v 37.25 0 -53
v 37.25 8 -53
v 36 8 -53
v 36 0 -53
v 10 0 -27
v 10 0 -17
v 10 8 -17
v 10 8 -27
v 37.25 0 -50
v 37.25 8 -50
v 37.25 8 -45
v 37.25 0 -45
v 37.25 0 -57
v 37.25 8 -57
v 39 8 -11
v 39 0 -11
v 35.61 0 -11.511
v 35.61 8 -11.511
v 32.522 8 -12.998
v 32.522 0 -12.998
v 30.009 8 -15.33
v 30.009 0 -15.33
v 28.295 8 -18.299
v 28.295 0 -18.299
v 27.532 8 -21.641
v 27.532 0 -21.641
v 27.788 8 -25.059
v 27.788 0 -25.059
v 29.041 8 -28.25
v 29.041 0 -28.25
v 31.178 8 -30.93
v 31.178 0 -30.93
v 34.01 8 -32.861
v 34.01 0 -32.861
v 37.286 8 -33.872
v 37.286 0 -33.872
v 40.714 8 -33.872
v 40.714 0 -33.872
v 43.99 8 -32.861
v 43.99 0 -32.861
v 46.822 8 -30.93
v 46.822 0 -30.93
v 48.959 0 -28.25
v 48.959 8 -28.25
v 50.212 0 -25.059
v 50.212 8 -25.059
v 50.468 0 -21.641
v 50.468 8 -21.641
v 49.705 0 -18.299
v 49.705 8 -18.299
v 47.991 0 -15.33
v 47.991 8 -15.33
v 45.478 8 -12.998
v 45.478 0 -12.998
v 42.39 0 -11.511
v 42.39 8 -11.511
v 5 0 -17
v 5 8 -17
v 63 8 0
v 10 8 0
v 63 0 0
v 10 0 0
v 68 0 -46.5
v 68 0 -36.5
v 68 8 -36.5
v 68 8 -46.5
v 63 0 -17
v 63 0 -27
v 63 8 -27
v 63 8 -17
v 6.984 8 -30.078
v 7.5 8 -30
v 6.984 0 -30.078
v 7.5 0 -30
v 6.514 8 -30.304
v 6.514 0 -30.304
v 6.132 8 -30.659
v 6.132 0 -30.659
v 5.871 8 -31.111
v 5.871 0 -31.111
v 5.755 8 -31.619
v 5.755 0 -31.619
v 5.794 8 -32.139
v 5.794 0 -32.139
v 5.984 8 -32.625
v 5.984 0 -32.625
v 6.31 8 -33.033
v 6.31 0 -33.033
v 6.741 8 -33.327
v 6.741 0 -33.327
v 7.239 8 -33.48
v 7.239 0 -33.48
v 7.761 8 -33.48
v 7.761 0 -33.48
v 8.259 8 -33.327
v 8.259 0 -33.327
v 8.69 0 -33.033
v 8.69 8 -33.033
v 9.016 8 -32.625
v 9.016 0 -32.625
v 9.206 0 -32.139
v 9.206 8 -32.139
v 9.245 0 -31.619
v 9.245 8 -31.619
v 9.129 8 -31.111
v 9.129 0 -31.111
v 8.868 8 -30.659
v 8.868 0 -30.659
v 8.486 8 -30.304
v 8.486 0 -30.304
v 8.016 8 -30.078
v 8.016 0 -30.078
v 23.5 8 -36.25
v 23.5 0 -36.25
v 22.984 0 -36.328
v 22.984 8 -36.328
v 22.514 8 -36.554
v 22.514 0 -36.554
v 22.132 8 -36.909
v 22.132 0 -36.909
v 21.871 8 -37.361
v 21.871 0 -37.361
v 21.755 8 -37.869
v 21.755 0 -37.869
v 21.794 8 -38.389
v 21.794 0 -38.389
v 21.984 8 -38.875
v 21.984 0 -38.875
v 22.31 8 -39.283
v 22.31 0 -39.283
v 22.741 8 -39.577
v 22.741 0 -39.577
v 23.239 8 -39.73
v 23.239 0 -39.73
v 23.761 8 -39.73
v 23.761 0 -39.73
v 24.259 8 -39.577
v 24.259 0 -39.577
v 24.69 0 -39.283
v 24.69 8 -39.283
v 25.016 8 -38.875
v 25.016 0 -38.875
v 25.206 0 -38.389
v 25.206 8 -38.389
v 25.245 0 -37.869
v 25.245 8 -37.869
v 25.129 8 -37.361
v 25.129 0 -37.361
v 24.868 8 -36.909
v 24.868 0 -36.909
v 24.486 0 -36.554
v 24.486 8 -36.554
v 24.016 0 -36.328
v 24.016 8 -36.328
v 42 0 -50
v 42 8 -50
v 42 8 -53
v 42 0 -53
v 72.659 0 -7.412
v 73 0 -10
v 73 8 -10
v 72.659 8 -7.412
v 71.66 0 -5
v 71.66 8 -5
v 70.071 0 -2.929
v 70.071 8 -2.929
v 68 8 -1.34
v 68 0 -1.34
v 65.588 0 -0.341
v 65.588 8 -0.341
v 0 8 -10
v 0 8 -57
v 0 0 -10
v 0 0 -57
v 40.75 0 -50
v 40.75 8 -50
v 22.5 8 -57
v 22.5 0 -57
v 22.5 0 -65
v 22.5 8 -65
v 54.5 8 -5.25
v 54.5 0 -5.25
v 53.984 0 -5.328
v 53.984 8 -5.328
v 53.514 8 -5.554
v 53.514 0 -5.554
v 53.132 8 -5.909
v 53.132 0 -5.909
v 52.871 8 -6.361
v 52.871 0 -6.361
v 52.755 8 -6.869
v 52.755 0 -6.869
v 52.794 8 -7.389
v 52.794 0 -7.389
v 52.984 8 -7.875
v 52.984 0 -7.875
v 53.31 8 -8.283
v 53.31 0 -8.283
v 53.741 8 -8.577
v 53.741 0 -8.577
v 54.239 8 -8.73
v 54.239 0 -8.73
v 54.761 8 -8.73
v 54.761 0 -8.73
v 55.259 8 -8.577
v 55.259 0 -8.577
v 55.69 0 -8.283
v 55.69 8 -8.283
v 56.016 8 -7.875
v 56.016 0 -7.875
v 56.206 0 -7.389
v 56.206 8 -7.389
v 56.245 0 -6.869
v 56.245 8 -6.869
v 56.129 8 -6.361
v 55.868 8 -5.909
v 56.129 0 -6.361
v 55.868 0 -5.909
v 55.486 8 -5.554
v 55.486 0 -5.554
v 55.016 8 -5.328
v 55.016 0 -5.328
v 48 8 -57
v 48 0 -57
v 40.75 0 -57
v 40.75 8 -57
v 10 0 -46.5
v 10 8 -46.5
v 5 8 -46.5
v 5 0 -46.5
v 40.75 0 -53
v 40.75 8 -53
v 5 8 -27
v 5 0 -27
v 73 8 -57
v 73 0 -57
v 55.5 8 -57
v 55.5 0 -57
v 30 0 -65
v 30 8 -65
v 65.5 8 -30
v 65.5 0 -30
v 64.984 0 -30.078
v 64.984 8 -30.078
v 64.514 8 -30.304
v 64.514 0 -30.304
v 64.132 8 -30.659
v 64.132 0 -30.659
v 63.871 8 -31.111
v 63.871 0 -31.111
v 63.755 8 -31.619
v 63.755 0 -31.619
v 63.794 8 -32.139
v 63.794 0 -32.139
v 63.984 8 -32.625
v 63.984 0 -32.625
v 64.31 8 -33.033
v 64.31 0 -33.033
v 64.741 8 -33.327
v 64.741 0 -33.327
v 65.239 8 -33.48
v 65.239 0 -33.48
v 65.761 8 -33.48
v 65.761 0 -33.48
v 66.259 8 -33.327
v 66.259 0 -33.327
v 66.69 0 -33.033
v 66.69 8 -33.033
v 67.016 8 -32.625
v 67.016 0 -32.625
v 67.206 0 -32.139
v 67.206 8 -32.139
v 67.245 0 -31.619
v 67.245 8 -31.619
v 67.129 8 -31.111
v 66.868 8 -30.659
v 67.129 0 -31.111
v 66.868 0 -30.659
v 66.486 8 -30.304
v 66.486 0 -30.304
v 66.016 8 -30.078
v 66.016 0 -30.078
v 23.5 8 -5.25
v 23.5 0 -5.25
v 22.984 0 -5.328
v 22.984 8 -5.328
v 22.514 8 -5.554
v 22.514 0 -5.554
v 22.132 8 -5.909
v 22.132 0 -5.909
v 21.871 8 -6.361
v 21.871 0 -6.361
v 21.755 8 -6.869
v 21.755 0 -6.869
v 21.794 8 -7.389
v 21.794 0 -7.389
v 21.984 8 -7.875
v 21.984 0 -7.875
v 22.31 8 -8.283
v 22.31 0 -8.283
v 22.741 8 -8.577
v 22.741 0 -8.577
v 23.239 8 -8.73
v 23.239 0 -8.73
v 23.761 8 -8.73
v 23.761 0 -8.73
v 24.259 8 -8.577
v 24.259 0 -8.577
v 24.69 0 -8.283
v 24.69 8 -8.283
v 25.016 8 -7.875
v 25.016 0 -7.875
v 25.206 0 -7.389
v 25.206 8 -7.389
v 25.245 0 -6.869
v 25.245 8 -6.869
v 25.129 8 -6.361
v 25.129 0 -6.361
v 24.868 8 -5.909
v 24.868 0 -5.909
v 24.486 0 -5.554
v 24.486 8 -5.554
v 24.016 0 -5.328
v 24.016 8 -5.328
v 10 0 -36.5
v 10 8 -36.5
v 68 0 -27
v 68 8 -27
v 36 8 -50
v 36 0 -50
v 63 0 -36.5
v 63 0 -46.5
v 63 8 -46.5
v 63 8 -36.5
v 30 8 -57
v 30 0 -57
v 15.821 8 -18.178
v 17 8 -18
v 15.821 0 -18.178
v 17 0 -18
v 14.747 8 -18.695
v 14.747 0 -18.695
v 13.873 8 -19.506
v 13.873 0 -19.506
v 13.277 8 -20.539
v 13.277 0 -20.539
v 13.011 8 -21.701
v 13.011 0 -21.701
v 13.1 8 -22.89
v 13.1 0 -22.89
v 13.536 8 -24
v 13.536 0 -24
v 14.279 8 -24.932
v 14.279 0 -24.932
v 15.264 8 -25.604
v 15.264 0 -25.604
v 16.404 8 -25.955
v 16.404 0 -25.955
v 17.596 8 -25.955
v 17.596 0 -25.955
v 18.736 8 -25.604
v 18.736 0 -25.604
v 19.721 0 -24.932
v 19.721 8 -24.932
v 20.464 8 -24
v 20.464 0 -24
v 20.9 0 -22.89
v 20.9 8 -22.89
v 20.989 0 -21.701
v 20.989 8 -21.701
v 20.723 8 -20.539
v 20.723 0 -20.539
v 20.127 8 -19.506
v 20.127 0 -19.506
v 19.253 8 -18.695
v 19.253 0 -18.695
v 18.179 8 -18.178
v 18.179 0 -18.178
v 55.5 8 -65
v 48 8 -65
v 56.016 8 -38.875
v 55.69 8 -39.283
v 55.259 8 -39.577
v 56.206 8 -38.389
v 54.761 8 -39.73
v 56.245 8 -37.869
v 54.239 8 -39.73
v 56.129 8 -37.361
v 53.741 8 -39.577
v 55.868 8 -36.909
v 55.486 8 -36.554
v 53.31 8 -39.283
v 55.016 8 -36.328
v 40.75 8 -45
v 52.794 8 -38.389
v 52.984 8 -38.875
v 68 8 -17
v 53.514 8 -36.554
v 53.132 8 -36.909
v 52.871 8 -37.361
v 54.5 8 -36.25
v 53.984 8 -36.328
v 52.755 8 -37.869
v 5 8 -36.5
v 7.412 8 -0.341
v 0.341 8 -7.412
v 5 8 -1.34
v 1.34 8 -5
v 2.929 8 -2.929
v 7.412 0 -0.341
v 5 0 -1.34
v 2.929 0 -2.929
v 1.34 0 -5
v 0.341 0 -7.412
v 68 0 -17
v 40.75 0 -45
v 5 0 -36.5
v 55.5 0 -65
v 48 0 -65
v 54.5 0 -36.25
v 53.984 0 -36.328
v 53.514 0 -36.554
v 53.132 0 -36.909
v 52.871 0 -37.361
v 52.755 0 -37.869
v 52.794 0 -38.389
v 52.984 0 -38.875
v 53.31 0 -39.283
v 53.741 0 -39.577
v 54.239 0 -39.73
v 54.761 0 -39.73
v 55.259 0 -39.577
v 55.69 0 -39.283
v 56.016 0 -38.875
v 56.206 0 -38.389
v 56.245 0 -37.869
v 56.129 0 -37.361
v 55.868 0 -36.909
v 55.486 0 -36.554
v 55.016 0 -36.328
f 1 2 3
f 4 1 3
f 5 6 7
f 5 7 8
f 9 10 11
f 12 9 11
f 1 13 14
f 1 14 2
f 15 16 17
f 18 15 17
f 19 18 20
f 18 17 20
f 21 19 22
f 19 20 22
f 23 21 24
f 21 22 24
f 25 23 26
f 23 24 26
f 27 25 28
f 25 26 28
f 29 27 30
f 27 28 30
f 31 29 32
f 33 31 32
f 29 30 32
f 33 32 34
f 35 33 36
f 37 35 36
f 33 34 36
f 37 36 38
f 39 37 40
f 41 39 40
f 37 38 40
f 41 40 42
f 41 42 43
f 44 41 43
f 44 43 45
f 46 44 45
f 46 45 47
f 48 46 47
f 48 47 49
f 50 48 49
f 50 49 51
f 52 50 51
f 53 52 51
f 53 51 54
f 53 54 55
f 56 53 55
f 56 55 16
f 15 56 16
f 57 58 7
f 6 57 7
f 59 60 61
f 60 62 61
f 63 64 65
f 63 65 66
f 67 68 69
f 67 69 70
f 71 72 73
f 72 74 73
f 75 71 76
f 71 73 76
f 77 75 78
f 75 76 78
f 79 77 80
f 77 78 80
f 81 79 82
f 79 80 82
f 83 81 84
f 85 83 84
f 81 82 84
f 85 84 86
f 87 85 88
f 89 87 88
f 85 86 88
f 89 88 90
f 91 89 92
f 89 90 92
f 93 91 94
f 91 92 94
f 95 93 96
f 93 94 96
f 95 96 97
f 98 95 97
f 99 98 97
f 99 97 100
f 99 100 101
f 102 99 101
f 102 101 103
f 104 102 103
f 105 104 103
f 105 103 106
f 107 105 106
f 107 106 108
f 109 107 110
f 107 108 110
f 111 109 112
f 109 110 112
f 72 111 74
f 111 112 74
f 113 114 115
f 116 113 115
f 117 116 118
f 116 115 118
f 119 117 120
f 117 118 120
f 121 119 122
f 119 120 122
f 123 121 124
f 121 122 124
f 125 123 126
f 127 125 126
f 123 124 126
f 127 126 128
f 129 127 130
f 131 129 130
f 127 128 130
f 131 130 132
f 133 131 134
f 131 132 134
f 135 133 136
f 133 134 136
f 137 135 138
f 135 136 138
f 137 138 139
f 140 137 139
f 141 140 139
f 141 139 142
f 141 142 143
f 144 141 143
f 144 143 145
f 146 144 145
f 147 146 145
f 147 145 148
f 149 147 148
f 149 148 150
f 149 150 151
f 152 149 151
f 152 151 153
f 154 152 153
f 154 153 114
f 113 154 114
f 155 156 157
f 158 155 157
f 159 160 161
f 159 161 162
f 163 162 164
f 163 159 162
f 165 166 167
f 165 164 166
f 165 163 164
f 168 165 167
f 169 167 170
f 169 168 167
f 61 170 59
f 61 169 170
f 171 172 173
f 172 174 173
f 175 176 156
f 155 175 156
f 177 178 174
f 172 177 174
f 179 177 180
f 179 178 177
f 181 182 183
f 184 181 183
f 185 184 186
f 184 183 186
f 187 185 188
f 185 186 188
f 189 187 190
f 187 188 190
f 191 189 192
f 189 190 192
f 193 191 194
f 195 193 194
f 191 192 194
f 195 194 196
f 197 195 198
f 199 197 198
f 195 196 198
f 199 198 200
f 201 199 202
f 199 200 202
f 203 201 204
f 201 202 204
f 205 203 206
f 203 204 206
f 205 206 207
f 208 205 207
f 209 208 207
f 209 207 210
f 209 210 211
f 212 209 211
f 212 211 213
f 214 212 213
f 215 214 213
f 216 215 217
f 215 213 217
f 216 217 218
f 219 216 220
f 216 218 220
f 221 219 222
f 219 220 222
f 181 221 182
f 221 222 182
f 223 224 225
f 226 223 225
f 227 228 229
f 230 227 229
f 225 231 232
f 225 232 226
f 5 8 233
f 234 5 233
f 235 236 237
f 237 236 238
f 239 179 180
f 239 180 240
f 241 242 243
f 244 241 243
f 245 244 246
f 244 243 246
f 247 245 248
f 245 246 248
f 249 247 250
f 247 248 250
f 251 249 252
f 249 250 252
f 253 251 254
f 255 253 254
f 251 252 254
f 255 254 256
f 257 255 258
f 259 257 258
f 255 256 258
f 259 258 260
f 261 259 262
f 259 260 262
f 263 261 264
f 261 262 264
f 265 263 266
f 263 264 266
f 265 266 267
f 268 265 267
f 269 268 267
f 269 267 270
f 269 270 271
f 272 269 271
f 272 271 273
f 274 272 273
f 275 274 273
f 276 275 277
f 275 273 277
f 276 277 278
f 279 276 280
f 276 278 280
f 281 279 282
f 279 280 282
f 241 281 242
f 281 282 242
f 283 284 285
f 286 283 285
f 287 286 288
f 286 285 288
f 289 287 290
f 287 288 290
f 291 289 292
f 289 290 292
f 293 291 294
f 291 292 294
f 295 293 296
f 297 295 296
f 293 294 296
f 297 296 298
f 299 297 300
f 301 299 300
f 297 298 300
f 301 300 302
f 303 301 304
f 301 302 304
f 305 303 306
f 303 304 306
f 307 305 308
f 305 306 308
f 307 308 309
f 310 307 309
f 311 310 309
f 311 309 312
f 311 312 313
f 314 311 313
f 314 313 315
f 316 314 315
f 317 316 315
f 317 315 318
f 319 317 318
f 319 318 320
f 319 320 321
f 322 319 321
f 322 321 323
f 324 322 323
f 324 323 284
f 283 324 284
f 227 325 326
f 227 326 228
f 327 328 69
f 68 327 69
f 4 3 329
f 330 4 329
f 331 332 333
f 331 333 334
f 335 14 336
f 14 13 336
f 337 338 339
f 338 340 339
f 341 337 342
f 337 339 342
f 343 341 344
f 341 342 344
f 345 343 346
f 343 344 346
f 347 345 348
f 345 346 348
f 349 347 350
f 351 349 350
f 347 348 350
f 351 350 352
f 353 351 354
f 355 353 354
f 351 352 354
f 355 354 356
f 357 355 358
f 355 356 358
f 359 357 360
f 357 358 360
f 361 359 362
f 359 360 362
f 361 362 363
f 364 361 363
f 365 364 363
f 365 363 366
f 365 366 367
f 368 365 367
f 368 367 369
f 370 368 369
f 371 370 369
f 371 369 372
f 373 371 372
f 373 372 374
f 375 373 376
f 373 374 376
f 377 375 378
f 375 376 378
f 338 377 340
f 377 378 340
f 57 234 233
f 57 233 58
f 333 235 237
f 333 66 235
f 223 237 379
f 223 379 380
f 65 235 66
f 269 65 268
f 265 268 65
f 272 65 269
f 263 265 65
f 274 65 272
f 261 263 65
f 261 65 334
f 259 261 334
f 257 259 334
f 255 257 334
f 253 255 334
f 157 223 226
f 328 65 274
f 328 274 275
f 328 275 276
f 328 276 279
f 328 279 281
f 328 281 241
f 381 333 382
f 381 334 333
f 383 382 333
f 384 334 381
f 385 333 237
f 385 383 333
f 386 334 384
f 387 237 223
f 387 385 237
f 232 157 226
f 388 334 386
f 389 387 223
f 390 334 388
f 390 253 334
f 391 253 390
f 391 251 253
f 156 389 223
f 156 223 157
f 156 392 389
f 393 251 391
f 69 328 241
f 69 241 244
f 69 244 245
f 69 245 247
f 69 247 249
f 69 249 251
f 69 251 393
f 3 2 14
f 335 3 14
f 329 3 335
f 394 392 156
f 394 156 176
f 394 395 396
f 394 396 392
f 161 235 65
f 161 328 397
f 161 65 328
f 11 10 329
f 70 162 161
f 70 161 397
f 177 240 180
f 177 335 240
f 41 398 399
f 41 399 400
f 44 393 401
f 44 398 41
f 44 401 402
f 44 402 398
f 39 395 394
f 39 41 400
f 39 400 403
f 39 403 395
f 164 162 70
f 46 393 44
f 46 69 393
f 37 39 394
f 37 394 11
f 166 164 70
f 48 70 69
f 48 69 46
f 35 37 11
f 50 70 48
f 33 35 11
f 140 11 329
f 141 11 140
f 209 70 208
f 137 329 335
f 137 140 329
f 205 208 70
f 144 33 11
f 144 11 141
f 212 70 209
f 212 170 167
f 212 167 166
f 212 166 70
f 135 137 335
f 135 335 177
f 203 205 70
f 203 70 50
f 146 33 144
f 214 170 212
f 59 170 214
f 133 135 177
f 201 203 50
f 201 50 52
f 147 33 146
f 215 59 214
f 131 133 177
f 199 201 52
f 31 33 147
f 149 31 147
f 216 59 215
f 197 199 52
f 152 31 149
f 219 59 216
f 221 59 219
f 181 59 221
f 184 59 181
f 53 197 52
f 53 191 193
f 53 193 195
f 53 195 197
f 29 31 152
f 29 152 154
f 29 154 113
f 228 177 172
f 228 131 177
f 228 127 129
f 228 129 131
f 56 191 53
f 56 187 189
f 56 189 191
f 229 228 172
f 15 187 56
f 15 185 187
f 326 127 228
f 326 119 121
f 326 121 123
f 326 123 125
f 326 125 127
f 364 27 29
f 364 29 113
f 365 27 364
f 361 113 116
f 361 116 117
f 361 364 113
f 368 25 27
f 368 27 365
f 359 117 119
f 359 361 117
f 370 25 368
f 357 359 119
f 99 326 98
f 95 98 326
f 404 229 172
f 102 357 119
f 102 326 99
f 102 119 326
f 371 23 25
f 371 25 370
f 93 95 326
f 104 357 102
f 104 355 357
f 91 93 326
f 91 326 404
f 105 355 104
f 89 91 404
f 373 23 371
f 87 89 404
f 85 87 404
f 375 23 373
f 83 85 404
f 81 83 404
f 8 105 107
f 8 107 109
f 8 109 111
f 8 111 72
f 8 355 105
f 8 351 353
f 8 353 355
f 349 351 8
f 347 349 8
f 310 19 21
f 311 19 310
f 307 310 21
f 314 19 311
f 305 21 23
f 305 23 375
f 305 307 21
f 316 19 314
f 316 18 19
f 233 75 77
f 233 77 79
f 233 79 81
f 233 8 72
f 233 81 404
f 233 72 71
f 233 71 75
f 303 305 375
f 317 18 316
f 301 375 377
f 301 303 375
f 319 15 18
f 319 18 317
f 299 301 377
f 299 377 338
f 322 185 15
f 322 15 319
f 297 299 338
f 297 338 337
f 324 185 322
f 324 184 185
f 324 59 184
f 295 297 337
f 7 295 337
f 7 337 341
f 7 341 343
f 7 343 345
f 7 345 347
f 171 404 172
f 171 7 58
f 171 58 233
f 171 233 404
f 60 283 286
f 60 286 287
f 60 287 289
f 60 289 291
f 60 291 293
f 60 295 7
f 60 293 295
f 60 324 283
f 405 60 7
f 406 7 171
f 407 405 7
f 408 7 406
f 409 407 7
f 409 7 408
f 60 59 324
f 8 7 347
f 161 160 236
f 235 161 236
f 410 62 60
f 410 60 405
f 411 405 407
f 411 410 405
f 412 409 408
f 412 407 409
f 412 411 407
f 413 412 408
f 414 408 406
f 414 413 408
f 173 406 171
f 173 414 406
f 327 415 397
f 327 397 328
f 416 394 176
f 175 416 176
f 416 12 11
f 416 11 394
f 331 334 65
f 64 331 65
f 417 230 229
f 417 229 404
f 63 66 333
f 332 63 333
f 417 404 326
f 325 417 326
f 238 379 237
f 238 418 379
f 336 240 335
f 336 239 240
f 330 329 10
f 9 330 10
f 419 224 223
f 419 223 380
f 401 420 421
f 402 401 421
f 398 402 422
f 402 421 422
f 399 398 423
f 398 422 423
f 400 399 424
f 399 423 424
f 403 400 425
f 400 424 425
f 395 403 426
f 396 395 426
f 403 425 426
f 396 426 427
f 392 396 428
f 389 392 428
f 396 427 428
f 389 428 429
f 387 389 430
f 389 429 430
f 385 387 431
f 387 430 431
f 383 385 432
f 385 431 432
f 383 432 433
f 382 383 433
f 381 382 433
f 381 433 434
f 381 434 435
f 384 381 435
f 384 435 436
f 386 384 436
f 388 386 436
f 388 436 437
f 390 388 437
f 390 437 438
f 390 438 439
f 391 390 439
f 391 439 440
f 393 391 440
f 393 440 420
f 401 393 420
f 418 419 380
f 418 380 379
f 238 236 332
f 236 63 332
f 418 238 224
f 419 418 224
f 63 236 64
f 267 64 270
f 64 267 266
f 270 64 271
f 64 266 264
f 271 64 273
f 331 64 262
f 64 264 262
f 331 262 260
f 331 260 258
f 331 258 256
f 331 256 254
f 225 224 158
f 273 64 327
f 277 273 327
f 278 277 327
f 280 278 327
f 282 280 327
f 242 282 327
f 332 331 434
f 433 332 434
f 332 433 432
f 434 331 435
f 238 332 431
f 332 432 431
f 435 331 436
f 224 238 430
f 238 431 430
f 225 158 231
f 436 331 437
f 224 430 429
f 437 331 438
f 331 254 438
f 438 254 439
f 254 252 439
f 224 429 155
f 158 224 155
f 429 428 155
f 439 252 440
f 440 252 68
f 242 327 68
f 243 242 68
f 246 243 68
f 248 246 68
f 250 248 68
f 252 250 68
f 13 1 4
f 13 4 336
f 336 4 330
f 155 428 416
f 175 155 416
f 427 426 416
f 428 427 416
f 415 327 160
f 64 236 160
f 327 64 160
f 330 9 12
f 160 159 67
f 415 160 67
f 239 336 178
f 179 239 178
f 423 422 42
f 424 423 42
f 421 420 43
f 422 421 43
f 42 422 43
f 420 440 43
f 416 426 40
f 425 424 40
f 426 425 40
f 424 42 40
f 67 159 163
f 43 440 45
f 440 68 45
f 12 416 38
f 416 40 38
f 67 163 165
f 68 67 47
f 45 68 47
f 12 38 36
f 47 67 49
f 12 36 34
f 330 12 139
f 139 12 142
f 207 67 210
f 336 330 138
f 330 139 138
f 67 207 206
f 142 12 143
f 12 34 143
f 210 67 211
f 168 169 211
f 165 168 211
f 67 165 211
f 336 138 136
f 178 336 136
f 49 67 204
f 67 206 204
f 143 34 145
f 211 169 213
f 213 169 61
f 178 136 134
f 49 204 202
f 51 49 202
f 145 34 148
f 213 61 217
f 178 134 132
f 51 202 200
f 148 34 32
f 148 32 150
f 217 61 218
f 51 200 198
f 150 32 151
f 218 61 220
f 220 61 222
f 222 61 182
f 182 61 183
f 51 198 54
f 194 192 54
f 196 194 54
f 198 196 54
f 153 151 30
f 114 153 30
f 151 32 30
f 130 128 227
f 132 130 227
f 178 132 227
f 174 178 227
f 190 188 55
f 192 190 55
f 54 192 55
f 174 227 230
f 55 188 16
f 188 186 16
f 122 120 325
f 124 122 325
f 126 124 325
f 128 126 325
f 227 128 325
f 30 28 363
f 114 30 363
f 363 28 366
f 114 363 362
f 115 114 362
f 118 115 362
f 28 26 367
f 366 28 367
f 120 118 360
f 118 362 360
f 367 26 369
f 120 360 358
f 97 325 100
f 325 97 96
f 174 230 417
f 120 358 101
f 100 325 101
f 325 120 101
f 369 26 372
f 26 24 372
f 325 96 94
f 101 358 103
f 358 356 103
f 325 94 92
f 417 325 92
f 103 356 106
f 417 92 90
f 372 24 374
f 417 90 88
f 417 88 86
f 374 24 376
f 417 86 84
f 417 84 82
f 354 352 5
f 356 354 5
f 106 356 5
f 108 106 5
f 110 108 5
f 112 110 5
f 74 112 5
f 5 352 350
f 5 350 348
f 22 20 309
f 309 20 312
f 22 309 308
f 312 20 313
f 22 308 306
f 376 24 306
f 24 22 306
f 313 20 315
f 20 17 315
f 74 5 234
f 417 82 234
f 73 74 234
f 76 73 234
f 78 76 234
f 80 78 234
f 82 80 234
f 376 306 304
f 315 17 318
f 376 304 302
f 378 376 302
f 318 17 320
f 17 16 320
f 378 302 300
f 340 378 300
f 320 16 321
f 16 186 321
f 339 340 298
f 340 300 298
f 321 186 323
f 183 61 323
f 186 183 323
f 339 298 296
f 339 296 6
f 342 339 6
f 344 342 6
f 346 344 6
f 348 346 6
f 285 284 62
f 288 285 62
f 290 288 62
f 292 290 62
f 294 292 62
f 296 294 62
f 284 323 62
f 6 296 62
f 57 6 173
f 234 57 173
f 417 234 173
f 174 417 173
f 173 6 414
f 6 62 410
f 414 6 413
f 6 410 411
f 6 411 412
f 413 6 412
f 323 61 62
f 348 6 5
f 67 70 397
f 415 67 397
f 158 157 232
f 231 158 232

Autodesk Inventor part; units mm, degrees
ref_plane "YZ Plane" through (0, 0, 0) normal (1, 0, 0) x (0, 1, 0)
sketch "Sketch1" plane through (0, 0, 0) normal (0, 1, 0) x (-1, 0, 0)
  line L0 (-10, 0) -> (-63, 0)
  line L1 (-73, -10) -> (-73, -57)
  line L2 (0, -57) -> (0, -10)
  line L3 (-22.5, -57) -> (-22.5, -65)
  line L4 (-22.5, -65) -> (-30, -65)
  line L5 (-30, -65) -> (-30, -57)
  line L6 (-48, -57) -> (-48, -65)
  line L7 (-48, -65) -> (-55.5, -65)
  line L8 (-55.5, -65) -> (-55.5, -57)
  line L9 (-73, -57) -> (-55.5, -57)
  line L10 (-22.5, -57) -> (0, -57)
  line L11 (-37.25, -57) -> (-37.25, -53)
  line L12 (-37.25, -53) -> (-36, -53)
  line L13 (-36, -53) -> (-36, -50)
  line L14 (-36, -50) -> (-37.25, -50)
  line L15 (-37.25, -50) -> (-37.25, -45)
  line L16 (-37.25, -45) -> (-40.75, -45)
  line L17 (-40.75, -45) -> (-40.75, -50)
  line L18 (-40.75, -50) -> (-42, -50)
  line L19 (-42, -50) -> (-42, -53)
  line L20 (-42, -53) -> (-40.75, -53)
  line L21 (-40.75, -53) -> (-40.75, -57)
  line L22 (-48, -57) -> (-40.75, -57)
  line L23 (-37.25, -57) -> (-30, -57)
  arc A0 (0, -10) -> (-10, 0) centre (-10, -10) ccw
  arc A1 (-63, 0) -> (-73, -10) centre (-63, -10) ccw
  line L24 (-5, -17) -> (-10, -17)
  line L25 (-10, -17) -> (-10, -27)
  line L26 (-10, -27) -> (-5, -27)
  line L27 (-5, -27) -> (-5, -17)
  line L28 (-5, -36.5) -> (-10, -36.5)
  line L29 (-10, -36.5) -> (-10, -46.5)
  line L30 (-10, -46.5) -> (-5, -46.5)
  line L31 (-5, -46.5) -> (-5, -36.5)
  line L32 (-63, -17) -> (-68, -17)
  line L33 (-68, -17) -> (-68, -27)
  line L34 (-68, -27) -> (-63, -27)
  line L35 (-63, -27) -> (-63, -17)
  line L36 (-63, -36.5) -> (-68, -36.5)
  line L37 (-68, -36.5) -> (-68, -46.5)
  line L38 (-68, -46.5) -> (-63, -46.5)
  line L39 (-63, -46.5) -> (-63, -36.5)
  line L40 (-39, -45) -> (-39, -65) construction
  point P0 (0, 0)
  point P1 (-73, 0)
  dimension "d0" = 73
  dimension "d1" = 57
  dimension "d2" = 22.5
  dimension "d3" = 7.5
  dimension "d4" = 8
  dimension "d5" = 17.5
  dimension "d6" = 18
  dimension "d7" = 3.5
  dimension "d8" = 6
  dimension "d9" = 4
  dimension "d10" = 3
  dimension "d11" = 5
  dimension "d12" = 10
  dimension "d13" = 5
  dimension "d14" = 10
  dimension "d15" = 5
  dimension "d17" = 9.5
  dimension "d18" = 5
  dimension "d19" = 10.5
extrude "Extrusion1" add sketch "Sketch1" along normal blind 8
sketch "Sketch2" plane through (0, 8, 0) normal (0, 1, 0) x (1, 0, 0)
  line L0 (63, 36.5) -> (63, 46.5) construction
  line L1 (63, 46.5) -> (68, 46.5) construction
  line L2 (68, 46.5) -> (68, 36.5) construction
  line L3 (68, 36.5) -> (63, 36.5) construction
  line L4 (63, 17) -> (63, 27) construction
  line L5 (63, 27) -> (68, 27) construction
  line L6 (68, 27) -> (68, 17) construction
  line L7 (68, 17) -> (63, 17) construction
  line L8 (5, 36.5) -> (5, 46.5) construction
  line L9 (5, 46.5) -> (10, 46.5) construction
  line L10 (10, 46.5) -> (10, 36.5) construction
  line L11 (10, 36.5) -> (5, 36.5) construction
  line L12 (5, 17) -> (5, 27) construction
  line L13 (5, 27) -> (10, 27) construction
  line L14 (10, 27) -> (10, 17) construction
  line L15 (10, 17) -> (5, 17) construction
  line L16 (73, 10) -> (73, 57) construction
  line L17 (73, 57) -> (55.5, 57) construction
  line L18 (55.5, 57) -> (55.5, 65) construction
  line L19 (55.5, 65) -> (48, 65) construction
  line L20 (48, 65) -> (48, 57) construction
  line L21 (48, 57) -> (40.75, 57) construction
  line L22 (40.75, 57) -> (40.75, 53) construction
  line L23 (40.75, 53) -> (42, 53) construction
  line L24 (42, 53) -> (42, 50) construction
  line L25 (42, 50) -> (40.75, 50) construction
  line L26 (40.75, 50) -> (40.75, 45) construction
  line L27 (40.75, 45) -> (37.25, 45) construction
  line L28 (37.25, 45) -> (37.25, 50) construction
  line L29 (37.25, 50) -> (36, 50) construction
  line L30 (36, 50) -> (36, 53) construction
  line L31 (36, 53) -> (37.25, 53) construction
  line L32 (37.25, 53) -> (37.25, 57) construction
  line L33 (37.25, 57) -> (30, 57) construction
  line L34 (30, 57) -> (30, 65) construction
  line L35 (30, 65) -> (22.5, 65) construction
  line L36 (22.5, 65) -> (22.5, 57) construction
  line L37 (22.5, 57) -> (0, 57) construction
  line L38 (0, 57) -> (0, 10) construction
  arc A0 (0, 10) -> (10, 0) centre (10, 10) ccw construction
  line L39 (10, 0) -> (63, 0) construction
  arc A1 (63, 0) -> (73, 10) centre (63, 10) ccw construction
  line L40 (10, 27) -> (5, 27) construction
  line L41 (7.5, 27) -> (7.5, 36.5) construction
  line L42 (5, 36.5) -> (10, 36.5) construction
  line L43 (65.5, 27) -> (65.5, 36.5) construction
  line L44 (68, 36.5) -> (63, 36.5) construction
  line L45 (23.5, 38) -> (54.5, 38) construction
  line L46 (54.5, 38) -> (54.5, 7) construction
  line L47 (54.5, 7) -> (23.5, 7) construction
  line L48 (23.5, 7) -> (23.5, 38) construction
  line L49 (23.5, 22.5) -> (54.5, 22.5) construction
  point P0 (0, 0)
  point P1 (7.5, 31.75)
  point P2 (65.5, 31.75)
  point P3 (17, 22)
  point P4 (39, 22.5)
  dimension "d22" = 31
  dimension "d23" = 31
  dimension "d24" = 7
  dimension "d25" = 23.5
  dimension "d26" = 17
  dimension "d27" = 22
hole "Hole1" at (7.5, 8, -31.75) at (65.5, 8, -31.75) at (23.5, 8, -38) at (54.5, 8, -38) at (54.5, 8, -7) at (23.5, 8, -7) direction (0, -1, 0) diameter 3.5 end through all
hole "Hole2" at (17, 8, -22) direction (0, -1, 0) diameter 8 end through all
hole "Hole3" at (39, 8, -22.5) direction (0, -1, 0) diameter 23 end through all
ref_plane "Work Plane1" through (0, 4, 0) normal (0, 1, 0) x (-1, 0, 0)
ref_plane "Work Plane2" through (39, 0, -45) normal (1, 0, 0) x (0, 0, -1)
equation "\"d49\" = 0.5 * THICKNESS"
equation "\"THICKNESS\" = 8"
properties part number "A8-0002"
